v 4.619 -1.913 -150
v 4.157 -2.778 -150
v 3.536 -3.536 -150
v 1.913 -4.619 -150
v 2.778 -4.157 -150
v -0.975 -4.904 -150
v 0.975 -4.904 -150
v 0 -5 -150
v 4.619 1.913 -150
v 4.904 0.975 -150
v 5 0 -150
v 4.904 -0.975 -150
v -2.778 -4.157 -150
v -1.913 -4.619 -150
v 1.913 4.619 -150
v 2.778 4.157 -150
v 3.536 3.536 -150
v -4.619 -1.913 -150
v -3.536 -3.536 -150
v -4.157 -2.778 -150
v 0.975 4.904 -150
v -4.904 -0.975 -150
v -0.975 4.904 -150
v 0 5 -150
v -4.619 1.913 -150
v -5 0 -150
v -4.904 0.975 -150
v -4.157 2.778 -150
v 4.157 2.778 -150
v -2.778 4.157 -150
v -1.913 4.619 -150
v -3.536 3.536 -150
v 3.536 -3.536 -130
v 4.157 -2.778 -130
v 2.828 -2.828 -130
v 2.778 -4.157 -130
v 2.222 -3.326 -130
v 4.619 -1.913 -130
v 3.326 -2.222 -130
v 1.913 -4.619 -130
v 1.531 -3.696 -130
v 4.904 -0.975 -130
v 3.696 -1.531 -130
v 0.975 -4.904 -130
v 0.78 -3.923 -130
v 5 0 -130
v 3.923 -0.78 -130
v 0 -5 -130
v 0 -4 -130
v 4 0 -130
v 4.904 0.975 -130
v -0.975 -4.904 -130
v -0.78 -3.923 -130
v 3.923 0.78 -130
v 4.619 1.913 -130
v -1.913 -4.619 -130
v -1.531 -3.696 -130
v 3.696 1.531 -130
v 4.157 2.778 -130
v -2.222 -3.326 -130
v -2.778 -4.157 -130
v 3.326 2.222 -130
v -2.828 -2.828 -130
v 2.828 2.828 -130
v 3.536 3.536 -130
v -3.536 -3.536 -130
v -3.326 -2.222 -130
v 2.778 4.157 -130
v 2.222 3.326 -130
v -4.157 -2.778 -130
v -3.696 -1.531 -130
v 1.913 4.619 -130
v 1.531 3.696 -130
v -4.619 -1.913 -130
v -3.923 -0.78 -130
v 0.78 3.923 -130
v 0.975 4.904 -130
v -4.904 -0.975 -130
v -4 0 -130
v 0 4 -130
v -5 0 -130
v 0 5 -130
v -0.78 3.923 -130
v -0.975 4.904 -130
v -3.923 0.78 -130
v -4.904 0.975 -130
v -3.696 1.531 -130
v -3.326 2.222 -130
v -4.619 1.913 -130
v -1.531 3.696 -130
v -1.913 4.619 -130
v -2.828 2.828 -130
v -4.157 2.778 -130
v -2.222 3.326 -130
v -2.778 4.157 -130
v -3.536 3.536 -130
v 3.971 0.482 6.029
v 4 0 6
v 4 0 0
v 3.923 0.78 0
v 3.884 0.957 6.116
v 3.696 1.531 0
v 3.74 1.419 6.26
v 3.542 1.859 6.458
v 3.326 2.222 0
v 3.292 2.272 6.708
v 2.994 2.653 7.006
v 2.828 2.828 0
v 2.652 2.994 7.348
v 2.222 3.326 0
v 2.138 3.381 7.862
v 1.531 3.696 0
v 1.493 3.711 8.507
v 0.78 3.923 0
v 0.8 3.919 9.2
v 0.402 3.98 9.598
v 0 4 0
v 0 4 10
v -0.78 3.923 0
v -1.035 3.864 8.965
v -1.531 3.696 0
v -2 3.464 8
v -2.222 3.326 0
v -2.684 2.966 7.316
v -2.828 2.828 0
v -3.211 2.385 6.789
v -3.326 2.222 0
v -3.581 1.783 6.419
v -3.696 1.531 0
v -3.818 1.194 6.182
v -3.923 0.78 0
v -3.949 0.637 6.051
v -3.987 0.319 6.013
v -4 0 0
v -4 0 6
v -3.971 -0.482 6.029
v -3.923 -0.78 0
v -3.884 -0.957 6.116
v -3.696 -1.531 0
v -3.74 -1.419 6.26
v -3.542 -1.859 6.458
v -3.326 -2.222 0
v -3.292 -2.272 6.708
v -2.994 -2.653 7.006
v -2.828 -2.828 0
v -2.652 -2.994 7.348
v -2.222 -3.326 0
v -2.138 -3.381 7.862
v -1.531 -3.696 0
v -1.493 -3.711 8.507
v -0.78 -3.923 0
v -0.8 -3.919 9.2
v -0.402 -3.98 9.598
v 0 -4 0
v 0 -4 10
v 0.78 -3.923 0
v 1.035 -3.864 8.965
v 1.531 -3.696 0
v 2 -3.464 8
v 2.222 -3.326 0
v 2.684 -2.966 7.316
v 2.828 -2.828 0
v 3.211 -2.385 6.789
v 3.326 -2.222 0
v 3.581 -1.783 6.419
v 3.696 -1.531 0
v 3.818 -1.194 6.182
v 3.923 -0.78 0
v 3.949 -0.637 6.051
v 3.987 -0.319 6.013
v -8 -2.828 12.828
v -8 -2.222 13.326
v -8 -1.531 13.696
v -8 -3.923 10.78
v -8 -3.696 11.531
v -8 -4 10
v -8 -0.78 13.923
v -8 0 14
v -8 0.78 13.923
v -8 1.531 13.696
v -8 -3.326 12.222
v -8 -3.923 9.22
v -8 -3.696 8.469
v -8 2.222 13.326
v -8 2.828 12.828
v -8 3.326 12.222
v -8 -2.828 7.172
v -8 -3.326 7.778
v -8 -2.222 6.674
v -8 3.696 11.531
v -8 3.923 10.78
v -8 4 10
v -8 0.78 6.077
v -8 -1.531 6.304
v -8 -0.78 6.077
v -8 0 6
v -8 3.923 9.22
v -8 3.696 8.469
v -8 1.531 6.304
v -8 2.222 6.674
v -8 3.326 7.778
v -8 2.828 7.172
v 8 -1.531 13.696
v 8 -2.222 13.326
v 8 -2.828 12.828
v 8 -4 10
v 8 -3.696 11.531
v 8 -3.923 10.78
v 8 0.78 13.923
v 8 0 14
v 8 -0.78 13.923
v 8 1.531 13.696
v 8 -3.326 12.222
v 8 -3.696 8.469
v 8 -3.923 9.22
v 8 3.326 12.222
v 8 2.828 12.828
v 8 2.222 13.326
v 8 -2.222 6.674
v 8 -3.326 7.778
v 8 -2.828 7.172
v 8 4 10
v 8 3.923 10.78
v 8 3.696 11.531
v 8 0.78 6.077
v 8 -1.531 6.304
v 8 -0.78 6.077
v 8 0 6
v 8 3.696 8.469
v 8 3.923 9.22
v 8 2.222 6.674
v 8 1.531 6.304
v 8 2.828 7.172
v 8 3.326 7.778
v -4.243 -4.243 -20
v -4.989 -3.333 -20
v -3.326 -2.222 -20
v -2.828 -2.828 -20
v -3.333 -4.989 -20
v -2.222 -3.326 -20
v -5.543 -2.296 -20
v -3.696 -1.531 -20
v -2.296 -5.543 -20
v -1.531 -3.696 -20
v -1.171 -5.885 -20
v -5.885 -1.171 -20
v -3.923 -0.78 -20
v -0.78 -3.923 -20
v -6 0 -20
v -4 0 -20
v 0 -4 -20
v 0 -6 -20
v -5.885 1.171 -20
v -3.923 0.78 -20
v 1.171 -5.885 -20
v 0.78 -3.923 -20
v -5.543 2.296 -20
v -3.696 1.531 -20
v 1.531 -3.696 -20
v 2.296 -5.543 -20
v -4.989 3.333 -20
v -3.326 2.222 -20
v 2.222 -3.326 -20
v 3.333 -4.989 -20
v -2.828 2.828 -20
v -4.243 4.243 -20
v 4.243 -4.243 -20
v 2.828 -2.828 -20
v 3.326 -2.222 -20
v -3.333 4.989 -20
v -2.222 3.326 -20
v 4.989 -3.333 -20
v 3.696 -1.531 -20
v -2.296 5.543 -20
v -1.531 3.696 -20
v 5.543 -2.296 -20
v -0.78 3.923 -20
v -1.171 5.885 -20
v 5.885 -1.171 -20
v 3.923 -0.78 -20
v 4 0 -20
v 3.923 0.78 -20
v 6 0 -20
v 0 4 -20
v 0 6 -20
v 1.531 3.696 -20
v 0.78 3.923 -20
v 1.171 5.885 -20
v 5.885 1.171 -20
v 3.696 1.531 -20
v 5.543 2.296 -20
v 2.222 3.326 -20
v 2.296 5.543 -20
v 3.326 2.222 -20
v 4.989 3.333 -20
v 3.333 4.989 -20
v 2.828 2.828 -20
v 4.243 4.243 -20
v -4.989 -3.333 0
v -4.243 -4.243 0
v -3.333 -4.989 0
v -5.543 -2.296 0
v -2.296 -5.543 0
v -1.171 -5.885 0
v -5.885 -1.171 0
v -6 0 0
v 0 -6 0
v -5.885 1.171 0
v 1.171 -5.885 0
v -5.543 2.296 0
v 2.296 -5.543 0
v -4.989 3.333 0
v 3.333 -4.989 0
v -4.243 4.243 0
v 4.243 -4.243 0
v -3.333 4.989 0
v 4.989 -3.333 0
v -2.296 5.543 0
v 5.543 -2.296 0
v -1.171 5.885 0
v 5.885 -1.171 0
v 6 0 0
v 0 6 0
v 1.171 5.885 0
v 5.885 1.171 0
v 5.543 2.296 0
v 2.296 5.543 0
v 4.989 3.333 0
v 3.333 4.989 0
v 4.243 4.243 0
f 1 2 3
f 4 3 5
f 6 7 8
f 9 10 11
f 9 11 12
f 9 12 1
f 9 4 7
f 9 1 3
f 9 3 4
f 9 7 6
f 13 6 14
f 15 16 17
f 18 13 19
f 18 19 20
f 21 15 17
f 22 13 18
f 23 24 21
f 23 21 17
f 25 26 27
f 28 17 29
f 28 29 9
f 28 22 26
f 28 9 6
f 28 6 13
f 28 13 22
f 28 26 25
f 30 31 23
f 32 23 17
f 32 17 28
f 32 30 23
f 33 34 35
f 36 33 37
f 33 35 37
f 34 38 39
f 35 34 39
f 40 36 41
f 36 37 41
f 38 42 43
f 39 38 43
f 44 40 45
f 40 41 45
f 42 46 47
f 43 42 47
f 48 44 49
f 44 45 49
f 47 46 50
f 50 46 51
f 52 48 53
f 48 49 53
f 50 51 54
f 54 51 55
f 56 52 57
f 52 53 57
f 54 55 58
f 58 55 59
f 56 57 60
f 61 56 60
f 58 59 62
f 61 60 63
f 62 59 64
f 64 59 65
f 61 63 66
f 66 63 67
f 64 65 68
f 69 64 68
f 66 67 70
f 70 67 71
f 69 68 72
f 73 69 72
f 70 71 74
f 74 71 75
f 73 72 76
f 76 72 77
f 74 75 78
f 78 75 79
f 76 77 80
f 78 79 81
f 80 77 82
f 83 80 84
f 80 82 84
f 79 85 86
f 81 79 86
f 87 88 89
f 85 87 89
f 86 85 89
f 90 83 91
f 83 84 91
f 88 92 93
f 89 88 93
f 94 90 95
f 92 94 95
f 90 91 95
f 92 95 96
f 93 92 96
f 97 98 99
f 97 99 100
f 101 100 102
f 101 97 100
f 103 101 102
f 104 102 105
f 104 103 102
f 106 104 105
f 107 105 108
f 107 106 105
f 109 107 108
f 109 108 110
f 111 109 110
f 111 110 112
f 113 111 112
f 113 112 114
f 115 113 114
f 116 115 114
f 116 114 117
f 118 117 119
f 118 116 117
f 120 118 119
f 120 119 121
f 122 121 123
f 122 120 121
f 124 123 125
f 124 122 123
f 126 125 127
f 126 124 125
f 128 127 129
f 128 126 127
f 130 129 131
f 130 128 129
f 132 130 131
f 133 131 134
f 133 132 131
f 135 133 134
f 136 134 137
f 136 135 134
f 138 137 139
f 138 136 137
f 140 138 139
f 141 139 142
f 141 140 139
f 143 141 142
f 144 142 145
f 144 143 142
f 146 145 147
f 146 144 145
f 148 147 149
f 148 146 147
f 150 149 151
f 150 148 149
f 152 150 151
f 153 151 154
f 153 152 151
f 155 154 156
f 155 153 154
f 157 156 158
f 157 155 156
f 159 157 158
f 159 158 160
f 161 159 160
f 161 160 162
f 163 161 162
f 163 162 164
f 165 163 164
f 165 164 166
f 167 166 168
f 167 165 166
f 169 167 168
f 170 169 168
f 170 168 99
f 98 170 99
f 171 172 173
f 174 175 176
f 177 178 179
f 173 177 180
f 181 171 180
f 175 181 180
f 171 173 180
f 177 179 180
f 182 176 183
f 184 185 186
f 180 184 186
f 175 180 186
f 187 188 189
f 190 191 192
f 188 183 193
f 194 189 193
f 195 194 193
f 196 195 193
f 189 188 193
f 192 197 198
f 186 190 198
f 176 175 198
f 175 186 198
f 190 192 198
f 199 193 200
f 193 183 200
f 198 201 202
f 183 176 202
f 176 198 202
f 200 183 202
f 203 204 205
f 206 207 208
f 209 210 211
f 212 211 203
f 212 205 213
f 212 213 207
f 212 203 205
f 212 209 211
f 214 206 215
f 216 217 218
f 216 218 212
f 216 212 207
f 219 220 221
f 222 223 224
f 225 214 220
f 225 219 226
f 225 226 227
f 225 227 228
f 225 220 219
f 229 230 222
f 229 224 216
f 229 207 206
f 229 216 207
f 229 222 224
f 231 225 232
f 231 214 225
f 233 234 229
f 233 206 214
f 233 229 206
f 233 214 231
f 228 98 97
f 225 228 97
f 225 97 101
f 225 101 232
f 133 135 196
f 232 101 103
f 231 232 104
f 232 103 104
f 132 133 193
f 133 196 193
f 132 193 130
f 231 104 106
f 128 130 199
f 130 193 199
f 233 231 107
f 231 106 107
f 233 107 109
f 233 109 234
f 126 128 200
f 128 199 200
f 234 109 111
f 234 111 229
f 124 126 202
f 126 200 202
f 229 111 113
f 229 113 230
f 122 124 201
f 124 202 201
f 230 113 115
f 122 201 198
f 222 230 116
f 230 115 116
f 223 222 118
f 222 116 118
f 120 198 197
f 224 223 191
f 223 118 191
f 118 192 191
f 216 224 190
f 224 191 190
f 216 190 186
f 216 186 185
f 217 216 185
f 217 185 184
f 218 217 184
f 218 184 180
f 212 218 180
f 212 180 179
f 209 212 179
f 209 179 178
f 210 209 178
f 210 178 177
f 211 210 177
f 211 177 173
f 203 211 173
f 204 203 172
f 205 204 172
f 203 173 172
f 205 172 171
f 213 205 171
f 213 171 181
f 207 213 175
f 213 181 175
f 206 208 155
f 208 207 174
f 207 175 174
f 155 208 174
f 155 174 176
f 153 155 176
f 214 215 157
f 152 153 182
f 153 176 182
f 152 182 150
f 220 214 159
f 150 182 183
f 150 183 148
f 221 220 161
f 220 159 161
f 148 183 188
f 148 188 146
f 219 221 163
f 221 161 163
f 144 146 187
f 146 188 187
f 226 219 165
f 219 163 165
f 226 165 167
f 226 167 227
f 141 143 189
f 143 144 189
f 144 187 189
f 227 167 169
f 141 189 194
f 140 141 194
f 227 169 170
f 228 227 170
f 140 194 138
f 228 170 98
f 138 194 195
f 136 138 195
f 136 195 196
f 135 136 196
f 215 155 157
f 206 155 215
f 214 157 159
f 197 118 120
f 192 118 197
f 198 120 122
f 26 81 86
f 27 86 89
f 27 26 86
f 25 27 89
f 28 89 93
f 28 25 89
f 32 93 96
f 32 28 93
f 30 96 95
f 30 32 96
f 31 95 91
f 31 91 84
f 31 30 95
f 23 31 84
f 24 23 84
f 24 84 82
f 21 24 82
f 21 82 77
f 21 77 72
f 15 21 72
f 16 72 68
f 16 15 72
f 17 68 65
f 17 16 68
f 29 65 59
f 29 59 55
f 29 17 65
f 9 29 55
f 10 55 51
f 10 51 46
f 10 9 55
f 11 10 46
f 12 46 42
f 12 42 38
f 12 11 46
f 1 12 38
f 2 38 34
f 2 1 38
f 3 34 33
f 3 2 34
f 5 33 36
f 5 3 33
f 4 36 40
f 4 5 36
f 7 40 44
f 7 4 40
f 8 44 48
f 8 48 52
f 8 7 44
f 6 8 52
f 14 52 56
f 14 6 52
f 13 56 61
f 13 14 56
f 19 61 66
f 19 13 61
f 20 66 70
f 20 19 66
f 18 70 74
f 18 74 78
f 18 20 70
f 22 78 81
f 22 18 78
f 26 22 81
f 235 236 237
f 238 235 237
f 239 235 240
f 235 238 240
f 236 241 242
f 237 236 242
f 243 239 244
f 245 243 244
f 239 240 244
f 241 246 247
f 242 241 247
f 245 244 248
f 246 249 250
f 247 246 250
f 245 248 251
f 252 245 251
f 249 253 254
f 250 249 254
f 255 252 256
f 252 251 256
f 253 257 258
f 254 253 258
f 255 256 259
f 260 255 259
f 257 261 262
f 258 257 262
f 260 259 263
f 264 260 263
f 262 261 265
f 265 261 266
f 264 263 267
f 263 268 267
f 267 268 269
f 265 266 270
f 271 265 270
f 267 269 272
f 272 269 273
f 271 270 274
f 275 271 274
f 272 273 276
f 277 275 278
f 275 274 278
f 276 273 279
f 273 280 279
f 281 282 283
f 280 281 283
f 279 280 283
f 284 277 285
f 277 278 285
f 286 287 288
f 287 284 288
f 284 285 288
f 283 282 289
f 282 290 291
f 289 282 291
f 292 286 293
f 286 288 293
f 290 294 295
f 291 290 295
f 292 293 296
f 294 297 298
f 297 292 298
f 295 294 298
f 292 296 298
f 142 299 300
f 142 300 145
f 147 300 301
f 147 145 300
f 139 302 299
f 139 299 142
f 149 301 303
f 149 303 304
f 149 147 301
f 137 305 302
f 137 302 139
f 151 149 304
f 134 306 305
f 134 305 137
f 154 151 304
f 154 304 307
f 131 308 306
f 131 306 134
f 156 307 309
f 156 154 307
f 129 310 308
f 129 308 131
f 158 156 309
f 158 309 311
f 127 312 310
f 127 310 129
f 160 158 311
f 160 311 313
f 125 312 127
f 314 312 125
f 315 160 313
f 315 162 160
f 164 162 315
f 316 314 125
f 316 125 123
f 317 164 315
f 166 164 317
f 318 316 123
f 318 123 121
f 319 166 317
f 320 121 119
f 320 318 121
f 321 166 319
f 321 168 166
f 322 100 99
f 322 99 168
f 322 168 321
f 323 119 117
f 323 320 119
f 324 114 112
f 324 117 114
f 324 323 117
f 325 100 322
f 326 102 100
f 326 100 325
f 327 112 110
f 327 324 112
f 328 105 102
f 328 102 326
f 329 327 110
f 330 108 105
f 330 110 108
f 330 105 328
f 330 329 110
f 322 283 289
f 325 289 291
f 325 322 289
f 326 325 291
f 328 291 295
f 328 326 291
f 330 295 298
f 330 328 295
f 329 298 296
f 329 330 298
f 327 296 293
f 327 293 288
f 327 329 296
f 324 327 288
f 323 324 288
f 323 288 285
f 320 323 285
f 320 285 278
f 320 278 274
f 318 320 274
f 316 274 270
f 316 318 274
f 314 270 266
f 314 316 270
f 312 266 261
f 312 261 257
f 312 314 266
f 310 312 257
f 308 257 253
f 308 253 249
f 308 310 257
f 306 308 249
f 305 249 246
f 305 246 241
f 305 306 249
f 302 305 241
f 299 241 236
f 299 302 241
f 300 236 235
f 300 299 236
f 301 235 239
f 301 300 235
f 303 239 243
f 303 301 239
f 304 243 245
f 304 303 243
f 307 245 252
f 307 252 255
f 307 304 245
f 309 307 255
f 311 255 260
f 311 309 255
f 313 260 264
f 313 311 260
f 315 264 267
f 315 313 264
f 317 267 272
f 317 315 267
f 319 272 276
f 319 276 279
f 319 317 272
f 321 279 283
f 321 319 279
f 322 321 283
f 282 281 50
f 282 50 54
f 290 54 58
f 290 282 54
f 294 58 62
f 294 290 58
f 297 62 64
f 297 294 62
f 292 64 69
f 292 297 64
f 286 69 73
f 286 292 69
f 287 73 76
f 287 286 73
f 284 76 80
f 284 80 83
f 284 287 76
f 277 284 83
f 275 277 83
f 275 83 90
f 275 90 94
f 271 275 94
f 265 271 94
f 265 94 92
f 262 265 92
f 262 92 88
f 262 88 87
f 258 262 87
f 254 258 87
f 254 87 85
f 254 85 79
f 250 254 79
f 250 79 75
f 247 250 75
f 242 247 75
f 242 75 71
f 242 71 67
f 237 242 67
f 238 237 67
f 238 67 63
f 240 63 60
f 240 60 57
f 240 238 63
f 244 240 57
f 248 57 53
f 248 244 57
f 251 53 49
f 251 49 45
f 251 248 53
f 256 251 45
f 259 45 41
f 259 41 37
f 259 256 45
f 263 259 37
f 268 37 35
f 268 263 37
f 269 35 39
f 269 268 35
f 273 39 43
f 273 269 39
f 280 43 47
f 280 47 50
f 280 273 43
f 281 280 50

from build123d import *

# Parameters (mm, degrees)
SKETCH1_R                = 4
BOSS_EXTRUDE1_DEPTH      = 150
SKETCH2_R                = 5
BOSS_EXTRUDE2_DEPTH      = 20
SKETCH3_R                = 6
BOSS_EXTRUDE3_DEPTH      = 20
BOSS_EXTRUDE6_START      = 10
SKETCH4_R                = 4
BOSS_EXTRUDE6_DEPTH      = 10
BOSS_EXTRUDE7_DEPTH      = 8
BOSS_EXTRUDE7_DEPTH_BACK = 8
SKETCH6_R                = 4


with BuildPart() as part:
    # Sketch1 → Boss-Extrude1 (new body)
    with BuildSketch(Plane.XY):
        Circle(SKETCH1_R)
    extrude(amount=-BOSS_EXTRUDE1_DEPTH)

    # Sketch2 → Boss-Extrude2 (add)
    with BuildSketch(Plane(origin=(0, 0, -150), x_dir=(-1, 0, 0), z_dir=(0, 0, -1))):
        Circle(SKETCH2_R)
    extrude(amount=-BOSS_EXTRUDE2_DEPTH)

    # Sketch3 → Boss-Extrude3 (add)
    with BuildSketch(Plane.XY):
        Circle(SKETCH3_R)
    extrude(amount=-BOSS_EXTRUDE3_DEPTH)

    # Sketch4 → Boss-Extrude6 (add)
    with BuildSketch(Plane.XY.offset(BOSS_EXTRUDE6_START)):
        Circle(SKETCH4_R)
    extrude(amount=-BOSS_EXTRUDE6_DEPTH)

    # Sketch6 → Boss-Extrude7 (add, two sides: drawn at the far end of the back side and taken through both)
    with BuildSketch(Plane(origin=(0, 0, 0), x_dir=(0, 0, -1), z_dir=(1, 0, 0)).offset(-BOSS_EXTRUDE7_DEPTH_BACK)):
        with Locations((-10, 0)):
            Circle(SKETCH6_R)
    extrude(amount=BOSS_EXTRUDE7_DEPTH + BOSS_EXTRUDE7_DEPTH_BACK)


solid = part.part
